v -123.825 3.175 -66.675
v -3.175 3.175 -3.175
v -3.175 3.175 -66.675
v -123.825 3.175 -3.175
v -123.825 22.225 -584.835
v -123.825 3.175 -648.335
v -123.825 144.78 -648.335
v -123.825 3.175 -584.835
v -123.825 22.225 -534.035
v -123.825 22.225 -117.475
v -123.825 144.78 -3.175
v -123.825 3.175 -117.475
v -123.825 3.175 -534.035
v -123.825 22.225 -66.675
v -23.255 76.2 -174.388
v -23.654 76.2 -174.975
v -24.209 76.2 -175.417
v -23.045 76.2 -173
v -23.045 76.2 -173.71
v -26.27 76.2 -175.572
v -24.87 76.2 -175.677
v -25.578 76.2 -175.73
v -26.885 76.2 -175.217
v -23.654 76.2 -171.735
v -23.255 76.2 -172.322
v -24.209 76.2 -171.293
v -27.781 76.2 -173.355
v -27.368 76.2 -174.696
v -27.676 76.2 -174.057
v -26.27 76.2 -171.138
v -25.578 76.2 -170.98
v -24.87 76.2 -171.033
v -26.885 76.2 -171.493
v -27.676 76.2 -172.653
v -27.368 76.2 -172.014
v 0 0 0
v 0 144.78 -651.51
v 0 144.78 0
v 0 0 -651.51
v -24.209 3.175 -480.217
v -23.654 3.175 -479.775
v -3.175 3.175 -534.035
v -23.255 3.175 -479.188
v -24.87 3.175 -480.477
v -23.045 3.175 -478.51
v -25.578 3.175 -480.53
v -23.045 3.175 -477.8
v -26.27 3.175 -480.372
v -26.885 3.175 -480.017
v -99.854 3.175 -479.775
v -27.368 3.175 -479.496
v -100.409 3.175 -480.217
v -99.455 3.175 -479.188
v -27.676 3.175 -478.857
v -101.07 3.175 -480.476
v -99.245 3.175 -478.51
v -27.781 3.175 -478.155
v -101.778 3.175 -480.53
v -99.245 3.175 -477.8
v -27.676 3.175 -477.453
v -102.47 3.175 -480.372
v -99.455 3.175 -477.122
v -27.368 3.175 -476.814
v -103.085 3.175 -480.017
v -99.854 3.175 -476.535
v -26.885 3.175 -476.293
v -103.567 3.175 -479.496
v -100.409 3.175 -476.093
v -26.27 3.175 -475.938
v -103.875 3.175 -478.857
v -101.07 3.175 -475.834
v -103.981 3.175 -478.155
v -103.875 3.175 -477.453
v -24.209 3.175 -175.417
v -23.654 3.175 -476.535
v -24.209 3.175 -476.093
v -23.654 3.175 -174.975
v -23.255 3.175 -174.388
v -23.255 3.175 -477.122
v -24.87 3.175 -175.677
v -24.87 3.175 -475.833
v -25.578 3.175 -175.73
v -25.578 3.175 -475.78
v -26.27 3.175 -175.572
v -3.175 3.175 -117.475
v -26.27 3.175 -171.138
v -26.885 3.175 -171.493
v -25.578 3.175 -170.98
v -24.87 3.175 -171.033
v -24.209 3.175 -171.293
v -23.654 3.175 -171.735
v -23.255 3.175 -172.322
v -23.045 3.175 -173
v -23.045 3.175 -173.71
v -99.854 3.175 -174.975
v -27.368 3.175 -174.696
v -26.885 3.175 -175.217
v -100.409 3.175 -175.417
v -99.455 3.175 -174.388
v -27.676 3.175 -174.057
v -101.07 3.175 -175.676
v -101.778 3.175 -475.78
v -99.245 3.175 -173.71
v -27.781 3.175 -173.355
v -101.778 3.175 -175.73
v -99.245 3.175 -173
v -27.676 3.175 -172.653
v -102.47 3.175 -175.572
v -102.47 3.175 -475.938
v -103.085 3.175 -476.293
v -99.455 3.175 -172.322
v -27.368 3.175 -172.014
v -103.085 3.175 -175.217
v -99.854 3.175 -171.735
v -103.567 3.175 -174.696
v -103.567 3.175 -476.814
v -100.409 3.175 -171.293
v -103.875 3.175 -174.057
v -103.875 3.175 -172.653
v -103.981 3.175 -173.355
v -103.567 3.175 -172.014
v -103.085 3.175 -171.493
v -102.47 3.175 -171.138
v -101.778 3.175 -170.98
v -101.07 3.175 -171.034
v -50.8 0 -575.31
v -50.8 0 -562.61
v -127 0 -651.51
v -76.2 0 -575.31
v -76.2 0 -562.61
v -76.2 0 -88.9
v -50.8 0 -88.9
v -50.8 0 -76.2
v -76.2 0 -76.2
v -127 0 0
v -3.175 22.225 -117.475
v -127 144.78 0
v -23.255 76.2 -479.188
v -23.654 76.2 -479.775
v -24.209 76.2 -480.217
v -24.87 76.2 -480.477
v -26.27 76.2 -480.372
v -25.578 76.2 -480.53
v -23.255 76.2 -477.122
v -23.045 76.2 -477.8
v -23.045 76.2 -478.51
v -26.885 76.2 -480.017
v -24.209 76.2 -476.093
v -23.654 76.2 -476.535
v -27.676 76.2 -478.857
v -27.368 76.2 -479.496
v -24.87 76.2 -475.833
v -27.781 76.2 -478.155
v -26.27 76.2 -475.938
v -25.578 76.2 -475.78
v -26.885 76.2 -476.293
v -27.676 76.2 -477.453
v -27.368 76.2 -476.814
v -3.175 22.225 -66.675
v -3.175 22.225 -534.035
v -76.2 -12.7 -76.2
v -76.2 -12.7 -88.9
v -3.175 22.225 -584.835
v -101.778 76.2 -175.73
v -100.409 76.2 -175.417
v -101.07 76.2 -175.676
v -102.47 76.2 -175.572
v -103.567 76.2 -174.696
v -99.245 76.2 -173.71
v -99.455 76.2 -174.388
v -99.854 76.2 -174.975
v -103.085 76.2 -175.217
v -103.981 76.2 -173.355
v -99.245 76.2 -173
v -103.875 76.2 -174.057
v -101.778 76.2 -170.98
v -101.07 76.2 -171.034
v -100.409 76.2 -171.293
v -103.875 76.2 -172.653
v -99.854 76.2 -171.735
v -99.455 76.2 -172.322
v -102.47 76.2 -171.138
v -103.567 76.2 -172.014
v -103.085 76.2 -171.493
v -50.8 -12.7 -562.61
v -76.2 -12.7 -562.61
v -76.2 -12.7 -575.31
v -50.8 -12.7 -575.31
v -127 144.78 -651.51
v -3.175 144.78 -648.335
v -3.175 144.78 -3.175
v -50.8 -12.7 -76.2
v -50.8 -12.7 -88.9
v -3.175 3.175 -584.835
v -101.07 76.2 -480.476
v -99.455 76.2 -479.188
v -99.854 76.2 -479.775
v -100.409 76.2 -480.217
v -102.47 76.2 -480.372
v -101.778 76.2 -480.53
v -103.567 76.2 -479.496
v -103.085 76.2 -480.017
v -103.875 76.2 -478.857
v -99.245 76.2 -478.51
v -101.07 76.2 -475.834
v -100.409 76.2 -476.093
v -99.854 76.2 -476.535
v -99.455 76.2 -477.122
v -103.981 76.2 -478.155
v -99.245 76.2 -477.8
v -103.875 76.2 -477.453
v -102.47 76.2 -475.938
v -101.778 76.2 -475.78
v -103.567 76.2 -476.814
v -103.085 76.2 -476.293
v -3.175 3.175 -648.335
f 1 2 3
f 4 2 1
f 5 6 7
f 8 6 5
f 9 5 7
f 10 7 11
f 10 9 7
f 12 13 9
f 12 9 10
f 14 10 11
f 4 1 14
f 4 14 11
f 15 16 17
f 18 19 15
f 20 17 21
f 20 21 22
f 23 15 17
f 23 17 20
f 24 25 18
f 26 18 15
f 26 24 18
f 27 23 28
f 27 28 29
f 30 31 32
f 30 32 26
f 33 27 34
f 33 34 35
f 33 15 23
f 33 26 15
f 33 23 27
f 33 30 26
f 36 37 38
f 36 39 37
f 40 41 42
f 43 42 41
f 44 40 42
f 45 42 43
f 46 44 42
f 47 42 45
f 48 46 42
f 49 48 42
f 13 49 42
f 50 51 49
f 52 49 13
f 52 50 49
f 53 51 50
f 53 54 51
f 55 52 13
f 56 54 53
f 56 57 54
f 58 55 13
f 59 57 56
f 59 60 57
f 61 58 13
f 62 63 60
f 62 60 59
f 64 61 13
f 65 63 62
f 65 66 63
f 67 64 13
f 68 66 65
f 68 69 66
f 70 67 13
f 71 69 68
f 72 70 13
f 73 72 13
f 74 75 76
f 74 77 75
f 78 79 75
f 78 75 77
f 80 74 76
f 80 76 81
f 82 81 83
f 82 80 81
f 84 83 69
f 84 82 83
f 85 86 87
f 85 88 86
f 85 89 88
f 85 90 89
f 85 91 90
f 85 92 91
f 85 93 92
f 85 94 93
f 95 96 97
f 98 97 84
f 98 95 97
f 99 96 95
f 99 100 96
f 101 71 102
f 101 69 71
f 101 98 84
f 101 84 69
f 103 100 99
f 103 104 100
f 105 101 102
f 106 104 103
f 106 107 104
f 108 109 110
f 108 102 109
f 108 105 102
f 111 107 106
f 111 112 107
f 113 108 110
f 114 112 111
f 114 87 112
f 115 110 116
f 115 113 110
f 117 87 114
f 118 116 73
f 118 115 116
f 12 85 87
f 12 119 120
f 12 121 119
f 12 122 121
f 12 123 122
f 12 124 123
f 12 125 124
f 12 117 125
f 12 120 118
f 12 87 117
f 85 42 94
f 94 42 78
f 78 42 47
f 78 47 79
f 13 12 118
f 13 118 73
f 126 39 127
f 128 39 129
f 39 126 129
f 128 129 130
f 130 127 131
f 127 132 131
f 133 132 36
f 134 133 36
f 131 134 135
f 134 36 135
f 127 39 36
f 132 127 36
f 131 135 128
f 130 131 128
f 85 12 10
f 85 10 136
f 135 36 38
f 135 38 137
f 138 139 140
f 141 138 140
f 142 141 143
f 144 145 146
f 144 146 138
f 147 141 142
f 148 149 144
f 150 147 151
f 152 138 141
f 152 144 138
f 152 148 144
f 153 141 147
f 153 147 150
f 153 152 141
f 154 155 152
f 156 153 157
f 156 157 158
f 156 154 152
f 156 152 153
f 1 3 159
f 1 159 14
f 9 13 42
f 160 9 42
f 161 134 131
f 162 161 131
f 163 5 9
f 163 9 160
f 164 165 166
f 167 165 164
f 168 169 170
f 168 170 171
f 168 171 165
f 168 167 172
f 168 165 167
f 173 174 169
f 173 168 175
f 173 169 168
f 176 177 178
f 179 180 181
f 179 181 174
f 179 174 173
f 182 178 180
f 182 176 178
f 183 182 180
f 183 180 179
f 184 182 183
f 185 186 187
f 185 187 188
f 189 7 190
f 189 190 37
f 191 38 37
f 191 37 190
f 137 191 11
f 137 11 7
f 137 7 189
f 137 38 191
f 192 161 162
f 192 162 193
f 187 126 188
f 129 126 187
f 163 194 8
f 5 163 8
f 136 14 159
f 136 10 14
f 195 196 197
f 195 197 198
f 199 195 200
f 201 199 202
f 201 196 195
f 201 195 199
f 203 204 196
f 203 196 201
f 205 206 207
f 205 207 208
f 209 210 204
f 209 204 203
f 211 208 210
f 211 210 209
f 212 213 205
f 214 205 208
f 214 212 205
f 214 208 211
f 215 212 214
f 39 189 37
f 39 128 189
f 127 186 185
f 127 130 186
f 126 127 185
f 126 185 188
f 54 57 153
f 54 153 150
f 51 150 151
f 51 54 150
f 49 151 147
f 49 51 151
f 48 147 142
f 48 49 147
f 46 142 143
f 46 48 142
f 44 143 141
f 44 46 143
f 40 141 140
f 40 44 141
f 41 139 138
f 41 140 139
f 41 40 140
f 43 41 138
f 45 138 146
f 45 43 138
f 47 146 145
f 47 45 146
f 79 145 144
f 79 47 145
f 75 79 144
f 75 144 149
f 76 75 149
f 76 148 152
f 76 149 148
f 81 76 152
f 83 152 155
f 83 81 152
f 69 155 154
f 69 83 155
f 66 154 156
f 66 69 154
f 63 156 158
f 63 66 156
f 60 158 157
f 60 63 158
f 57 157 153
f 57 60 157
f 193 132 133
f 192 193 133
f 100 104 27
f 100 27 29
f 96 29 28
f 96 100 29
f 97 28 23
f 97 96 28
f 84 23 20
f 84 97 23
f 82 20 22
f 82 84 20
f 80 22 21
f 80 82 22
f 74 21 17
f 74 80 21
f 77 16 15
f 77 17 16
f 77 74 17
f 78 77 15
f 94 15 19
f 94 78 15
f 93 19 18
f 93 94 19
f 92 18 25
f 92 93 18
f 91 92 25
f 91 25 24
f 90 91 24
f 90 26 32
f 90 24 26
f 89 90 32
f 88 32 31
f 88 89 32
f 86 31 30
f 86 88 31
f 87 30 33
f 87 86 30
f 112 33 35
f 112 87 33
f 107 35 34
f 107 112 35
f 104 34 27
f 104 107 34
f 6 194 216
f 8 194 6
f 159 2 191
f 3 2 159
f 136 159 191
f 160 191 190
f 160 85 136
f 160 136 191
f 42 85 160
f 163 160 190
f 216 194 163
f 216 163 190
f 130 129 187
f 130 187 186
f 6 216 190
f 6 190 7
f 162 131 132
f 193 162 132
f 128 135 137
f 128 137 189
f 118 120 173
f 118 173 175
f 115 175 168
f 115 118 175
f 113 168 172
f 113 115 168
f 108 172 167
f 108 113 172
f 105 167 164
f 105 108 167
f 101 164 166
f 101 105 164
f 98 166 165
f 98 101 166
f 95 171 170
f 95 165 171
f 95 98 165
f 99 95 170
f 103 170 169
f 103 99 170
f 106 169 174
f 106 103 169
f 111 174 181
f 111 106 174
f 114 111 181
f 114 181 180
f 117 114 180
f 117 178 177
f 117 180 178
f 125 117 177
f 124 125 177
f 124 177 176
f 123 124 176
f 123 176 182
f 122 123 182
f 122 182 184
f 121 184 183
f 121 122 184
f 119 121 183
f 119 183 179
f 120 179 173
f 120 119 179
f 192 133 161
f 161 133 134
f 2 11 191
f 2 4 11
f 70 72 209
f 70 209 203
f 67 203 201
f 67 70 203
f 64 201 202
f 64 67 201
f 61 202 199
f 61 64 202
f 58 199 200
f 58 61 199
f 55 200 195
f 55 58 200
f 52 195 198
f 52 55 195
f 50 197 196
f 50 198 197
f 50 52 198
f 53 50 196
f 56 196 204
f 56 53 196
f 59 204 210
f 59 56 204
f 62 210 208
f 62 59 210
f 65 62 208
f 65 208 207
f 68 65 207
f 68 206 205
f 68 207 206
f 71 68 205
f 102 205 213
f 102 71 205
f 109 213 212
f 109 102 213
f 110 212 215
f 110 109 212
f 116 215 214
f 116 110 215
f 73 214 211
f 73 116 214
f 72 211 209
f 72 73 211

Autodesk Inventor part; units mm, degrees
ref_plane "YZ Plane" through (0, 0, 0) normal (1, 0, 0) x (0, 1, 0)
ref_plane "XZ Plane" through (0, 0, 0) normal (0, 1, 0) x (-1, 0, 0)
ref_plane "XY Plane" through (0, 0, 0) normal (0, 0, 1) x (1, 0, 0)
sketch "Sketch1" plane through (0, 0, 0) normal (0, 1, 0) x (-1, 0, 0)
  line L0 (0, 0) -> (127, 0)
  line L1 (127, 0) -> (127, -651.51)
  line L2 (127, -651.51) -> (0, -651.51)
  line L3 (0, -651.51) -> (0, 0)
  line L4 (123.825, -3.175) -> (3.175, -3.175)
  line L5 (3.175, -3.175) -> (3.175, -648.335)
  line L6 (3.175, -648.335) -> (123.825, -648.335)
  line L7 (123.825, -648.335) -> (123.825, -3.175)
  circle A0 centre (101.6, -478.155) radius 2.3812
  circle A1 centre (25.4, -478.155) radius 2.3813
  line L8 (3.175, -325.755) -> (14.531, -325.755)
  circle A2 centre (101.6, -173.355) radius 2.3812
  circle A3 centre (25.4, -173.355) radius 2.3813
  dimension "d0" = 127
  dimension "d1" = 651.51
  dimension "d2" = 3.175
  dimension "d13" = 4.7625
  dimension "d14" = 4.7625
  dimension "d15" = 76.2
  dimension "d16" = 25.4
  dimension "d17" = 152.4
extrude "Extrusion1" add sketch "Sketch1" along normal blind 3.175 contours L7 L6 L5 L4
extrude "Extrusion2" add sketch "Sketch1" along normal blind 144.78 contours L0 L1 L2 L3
sketch "Sketch2" plane through (0, 0, 0) normal (0, -1, 0) x (1, 0, 0)
  line L0 (-50.8, -76.2) -> (-76.2, -76.2)
  line L1 (-76.2, -76.2) -> (-76.2, -88.9)
  line L2 (-76.2, -88.9) -> (-50.8, -88.9)
  line L3 (-50.8, -88.9) -> (-50.8, -76.2)
  line L4 (0, 0) -> (0, -651.51) projected
  line L5 (0, -325.755) -> (-127, -325.755)
  line L6 (-127, -651.51) -> (-127, 0) projected
  line L7 (-50.8, -575.31) -> (-76.2, -575.31)
  line L8 (-76.2, -575.31) -> (-76.2, -562.61)
  line L9 (-76.2, -562.61) -> (-50.8, -562.61)
  line L10 (-50.8, -562.61) -> (-50.8, -575.31)
  line L11 (-127, 0) -> (0, 0) projected
  dimension "d7" = 25.4
  dimension "d8" = 12.7
  dimension "d9" = 50.8
  dimension "d10" = 76.2
extrude "Extrusion3" add sketch "Sketch2" along normal blind 12.7 contours L3 L2 L1 L0 | L7 L8 L9 L10
extrude "Extrusion4" add sketch "Sketch1" along normal blind 76.2 contours A0 | A1 | A2 | A3
sketch "Sketch3" plane through (0, 3.175, 0) normal (0, 1, 0) x (1, 0, 0)
  line L0 (-3.175, 3.175) -> (-3.175, 648.335) projected
  line L1 (-123.825, 648.335) -> (-123.825, 3.175) projected
  line L2 (-3.175, 66.675) -> (-123.825, 66.675)
  line L3 (-123.825, 66.675) -> (-123.825, 117.475)
  line L4 (-123.825, 117.475) -> (-3.175, 117.475)
  line L5 (-3.175, 117.475) -> (-3.175, 66.675)
  line L6 (-3.175, 3.175) -> (-123.825, 3.175) projected
  line L7 (-127, 651.51) -> (-127, 0) projected
  line L8 (-127, 325.755) -> (-116.0264, 325.755)
  line L9 (-3.175, 584.835) -> (-123.825, 584.835)
  line L10 (-123.825, 584.835) -> (-123.825, 534.035)
  line L11 (-123.825, 534.035) -> (-3.175, 534.035)
  line L12 (-3.175, 534.035) -> (-3.175, 584.835)
  point P0 (0, 0)
  point P1 (-3.175, 534.035)
  point P2 (-3.175, 117.475)
  dimension "d20" = 50.8
  dimension "d21" = 63.5
extrude "Extrusion5" add sketch "Sketch3" along normal blind 19.05 contours L2 L1 L4 L0 | L11 L1 L9 L0
properties part number "Box"
